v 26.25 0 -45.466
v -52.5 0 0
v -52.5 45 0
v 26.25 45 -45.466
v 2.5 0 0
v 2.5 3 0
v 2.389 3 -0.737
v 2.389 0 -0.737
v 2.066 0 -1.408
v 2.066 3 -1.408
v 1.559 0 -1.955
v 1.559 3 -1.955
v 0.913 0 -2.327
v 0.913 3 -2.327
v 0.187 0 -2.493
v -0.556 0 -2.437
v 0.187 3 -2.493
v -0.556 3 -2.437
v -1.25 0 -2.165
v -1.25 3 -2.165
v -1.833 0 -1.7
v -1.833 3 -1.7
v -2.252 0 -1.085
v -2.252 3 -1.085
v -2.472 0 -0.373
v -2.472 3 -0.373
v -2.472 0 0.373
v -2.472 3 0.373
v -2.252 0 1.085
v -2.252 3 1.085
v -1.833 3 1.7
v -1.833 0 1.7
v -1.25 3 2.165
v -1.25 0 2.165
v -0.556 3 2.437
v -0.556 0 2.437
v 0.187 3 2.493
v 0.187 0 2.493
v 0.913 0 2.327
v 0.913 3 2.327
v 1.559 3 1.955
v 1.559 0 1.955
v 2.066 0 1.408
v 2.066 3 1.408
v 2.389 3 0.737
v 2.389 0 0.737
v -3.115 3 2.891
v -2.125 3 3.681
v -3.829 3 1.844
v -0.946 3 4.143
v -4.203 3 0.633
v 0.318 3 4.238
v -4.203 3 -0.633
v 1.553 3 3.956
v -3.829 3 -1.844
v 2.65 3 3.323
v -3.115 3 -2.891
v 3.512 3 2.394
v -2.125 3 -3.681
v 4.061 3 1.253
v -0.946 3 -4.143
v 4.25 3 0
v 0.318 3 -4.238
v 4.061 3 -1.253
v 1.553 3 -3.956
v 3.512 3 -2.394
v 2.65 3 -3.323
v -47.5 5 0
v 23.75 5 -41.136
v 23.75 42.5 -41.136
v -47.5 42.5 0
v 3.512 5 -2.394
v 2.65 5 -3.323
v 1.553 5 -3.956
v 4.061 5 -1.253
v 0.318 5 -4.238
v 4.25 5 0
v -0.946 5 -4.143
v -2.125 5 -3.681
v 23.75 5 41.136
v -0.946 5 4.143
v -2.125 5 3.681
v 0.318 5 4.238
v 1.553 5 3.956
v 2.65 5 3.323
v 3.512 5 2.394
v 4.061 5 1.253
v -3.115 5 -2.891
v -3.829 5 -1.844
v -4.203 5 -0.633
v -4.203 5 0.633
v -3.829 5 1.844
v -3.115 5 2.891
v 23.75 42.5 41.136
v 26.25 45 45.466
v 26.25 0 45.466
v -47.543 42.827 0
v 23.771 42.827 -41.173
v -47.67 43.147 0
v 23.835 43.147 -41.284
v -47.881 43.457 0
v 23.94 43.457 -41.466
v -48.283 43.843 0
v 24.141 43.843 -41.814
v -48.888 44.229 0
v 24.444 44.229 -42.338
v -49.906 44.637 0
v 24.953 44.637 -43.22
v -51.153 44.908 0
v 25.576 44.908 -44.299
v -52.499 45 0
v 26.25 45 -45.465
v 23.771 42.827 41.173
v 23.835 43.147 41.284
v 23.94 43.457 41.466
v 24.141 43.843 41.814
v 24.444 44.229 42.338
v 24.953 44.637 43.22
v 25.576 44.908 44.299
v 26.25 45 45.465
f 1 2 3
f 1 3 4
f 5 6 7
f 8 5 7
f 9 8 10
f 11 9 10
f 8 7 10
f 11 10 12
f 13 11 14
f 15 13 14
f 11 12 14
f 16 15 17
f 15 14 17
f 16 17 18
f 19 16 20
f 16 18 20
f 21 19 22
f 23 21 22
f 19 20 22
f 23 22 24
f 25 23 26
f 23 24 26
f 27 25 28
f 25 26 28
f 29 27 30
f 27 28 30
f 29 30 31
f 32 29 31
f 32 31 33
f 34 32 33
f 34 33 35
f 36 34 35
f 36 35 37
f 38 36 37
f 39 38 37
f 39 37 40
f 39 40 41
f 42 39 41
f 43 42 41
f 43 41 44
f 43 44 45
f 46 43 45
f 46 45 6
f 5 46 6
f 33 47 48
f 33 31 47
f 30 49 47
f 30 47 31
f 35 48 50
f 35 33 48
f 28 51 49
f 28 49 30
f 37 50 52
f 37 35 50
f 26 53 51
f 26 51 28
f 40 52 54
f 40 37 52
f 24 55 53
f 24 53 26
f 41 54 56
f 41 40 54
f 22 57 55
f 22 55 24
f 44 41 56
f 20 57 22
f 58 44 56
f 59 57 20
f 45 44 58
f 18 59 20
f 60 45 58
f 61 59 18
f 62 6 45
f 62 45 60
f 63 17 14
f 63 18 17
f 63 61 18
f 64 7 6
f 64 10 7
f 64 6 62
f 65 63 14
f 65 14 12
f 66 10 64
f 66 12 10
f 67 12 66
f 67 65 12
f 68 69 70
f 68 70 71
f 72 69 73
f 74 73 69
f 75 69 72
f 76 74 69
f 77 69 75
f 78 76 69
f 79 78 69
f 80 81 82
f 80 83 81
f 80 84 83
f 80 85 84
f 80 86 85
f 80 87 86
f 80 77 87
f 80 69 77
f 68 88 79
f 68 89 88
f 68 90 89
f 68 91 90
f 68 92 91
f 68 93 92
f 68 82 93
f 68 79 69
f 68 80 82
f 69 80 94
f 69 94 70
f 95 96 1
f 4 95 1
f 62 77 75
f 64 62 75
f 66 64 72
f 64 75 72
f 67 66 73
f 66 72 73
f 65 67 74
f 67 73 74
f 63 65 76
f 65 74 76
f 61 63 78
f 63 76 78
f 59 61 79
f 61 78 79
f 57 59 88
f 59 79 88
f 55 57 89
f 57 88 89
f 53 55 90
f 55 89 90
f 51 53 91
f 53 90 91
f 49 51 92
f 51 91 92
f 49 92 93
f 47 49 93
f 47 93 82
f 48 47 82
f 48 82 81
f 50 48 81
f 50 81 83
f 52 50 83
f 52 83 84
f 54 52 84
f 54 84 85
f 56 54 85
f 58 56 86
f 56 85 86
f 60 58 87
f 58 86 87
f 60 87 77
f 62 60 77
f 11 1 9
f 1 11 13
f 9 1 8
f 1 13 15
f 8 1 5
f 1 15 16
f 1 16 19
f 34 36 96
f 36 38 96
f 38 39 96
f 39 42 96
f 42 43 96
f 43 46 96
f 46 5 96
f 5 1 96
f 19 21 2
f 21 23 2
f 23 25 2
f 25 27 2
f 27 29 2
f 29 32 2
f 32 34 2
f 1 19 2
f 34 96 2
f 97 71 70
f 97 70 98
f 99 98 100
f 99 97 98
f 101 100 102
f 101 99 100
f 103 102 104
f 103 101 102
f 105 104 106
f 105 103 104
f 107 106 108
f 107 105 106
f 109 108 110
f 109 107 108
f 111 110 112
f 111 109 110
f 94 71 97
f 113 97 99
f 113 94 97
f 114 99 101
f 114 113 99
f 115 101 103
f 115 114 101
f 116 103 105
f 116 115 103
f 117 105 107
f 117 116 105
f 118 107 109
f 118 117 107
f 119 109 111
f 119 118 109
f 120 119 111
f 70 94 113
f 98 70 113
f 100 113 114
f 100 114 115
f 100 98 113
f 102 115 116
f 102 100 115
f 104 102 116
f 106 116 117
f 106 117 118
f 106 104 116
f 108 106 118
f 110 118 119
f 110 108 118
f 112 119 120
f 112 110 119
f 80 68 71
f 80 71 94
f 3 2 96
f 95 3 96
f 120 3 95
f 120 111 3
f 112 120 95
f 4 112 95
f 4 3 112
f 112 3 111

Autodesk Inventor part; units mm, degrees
ref_plane "YZ Plane" through (0, 0, 0) normal (1, 0, 0) x (0, 1, 0)
ref_plane "XZ Plane" through (0, 0, 0) normal (0, 1, 0) x (-1, 0, 0)
ref_plane "XY Plane" through (0, 0, 0) normal (0, 0, 1) x (1, 0, 0)
sketch "Sketch1" plane through (0, 0, 0) normal (0, 1, 0) x (-1, 0, 0)
  circle A0 centre (0, 0) radius 52.5
  line L0 (0, 0) -> (52.5, 0)
  line L1 (52.5, 0) -> (0, 0)
  line L2 (52.5, 0) -> (0, 0)
  line L3 (0, 0) -> (-26.25, 0)
  line L4 (-26.25, 0) -> (-26.25, 45.4663)
  line L5 (52.5, 0) -> (-26.25, 45.4663)
  line L6 (-26.25, 0) -> (-26.25, -45.4663)
  line L7 (52.5, 0) -> (-26.25, -45.4663)
extrude "Extrusion1" add sketch "Sketch1" along normal blind 5 contours L7 L6 L3 L0 | L0 L3 L4 L5
sketch "Sketch5" plane through (0, 5, 0) normal (0, 1, 0) x (1, 0, 0)
  circle A0 centre (0, 0) radius 4.25
  dimension "d9" = 8.5
extrude "Extrusion3" cut sketch "Sketch5" against normal blind 2
sketch "Sketch6" plane through (0, 5, 0) normal (0, 1, 0) x (1, 0, 0)
  circle A0 centre (0, 0) radius 2.5
  dimension "d12" = 5
extrude "Extrusion4" add sketch "Sketch6" against normal blind 10
sketch "Sketch7" plane through (0, 5, 0) normal (0, 1, 0) x (1, 0, 0)
  circle A0 centre (0, 0) radius 4.25 projected
  circle A1 centre (0, 0) radius 2.5
extrude "Extrusion5" cut sketch "Sketch7" against normal through all contours A1
sketch "Sketch8" plane through (0, 5, 0) normal (0, 1, 0) x (1, 0, 0)
  line L0 (-52.5, 0) -> (26.25, -45.4663) projected
  line L1 (-52.5, 0) -> (26.25, -45.4663)
  line L2 (26.25, 45.4663) -> (-52.5, 0) projected
  line L3 (26.25, -45.4663) -> (26.25, 45.4663)
  line L4 (26.25, 45.4663) -> (-52.5, 0)
  line L5 (26.25, -45.4663) -> (26.25, 45.4663) projected
  line L6 (26.25, 0) -> (23.75, 0)
  line L7 (-13.125, -22.7332) -> (-11.875, -20.5681)
  line L8 (-13.125, 22.7332) -> (-11.875, 20.5681)
  line L9 (-11.875, -20.5681) -> (-47.5, 0)
  line L10 (-47.5, 0) -> (-11.875, 20.5681)
  line L11 (23.75, 0) -> (23.75, 41.1362)
  line L12 (23.75, 41.1362) -> (-11.875, 20.5681)
  line L13 (23.75, 0) -> (23.75, -41.1362)
  line L14 (-11.875, -20.5681) -> (23.75, -41.1362)
  point P0 (0, 0)
  dimension "d17" = 2.5
  dimension "d18" = 2.5
extrude "Extrusion6" add sketch "Sketch8" along normal blind 40 contours L2 L8 L10 L9 L7 L0 | L7 L14 L13 L6 L3 L0 | L2 L3 L6 L11 L12 L8
fillet "Fillet1" radius 2.5 3 edges at (-11.875, 45, -20.5681) (23.75, 45, 0) (-11.875, 45, 20.5681)
properties part number "TrojkatP"
